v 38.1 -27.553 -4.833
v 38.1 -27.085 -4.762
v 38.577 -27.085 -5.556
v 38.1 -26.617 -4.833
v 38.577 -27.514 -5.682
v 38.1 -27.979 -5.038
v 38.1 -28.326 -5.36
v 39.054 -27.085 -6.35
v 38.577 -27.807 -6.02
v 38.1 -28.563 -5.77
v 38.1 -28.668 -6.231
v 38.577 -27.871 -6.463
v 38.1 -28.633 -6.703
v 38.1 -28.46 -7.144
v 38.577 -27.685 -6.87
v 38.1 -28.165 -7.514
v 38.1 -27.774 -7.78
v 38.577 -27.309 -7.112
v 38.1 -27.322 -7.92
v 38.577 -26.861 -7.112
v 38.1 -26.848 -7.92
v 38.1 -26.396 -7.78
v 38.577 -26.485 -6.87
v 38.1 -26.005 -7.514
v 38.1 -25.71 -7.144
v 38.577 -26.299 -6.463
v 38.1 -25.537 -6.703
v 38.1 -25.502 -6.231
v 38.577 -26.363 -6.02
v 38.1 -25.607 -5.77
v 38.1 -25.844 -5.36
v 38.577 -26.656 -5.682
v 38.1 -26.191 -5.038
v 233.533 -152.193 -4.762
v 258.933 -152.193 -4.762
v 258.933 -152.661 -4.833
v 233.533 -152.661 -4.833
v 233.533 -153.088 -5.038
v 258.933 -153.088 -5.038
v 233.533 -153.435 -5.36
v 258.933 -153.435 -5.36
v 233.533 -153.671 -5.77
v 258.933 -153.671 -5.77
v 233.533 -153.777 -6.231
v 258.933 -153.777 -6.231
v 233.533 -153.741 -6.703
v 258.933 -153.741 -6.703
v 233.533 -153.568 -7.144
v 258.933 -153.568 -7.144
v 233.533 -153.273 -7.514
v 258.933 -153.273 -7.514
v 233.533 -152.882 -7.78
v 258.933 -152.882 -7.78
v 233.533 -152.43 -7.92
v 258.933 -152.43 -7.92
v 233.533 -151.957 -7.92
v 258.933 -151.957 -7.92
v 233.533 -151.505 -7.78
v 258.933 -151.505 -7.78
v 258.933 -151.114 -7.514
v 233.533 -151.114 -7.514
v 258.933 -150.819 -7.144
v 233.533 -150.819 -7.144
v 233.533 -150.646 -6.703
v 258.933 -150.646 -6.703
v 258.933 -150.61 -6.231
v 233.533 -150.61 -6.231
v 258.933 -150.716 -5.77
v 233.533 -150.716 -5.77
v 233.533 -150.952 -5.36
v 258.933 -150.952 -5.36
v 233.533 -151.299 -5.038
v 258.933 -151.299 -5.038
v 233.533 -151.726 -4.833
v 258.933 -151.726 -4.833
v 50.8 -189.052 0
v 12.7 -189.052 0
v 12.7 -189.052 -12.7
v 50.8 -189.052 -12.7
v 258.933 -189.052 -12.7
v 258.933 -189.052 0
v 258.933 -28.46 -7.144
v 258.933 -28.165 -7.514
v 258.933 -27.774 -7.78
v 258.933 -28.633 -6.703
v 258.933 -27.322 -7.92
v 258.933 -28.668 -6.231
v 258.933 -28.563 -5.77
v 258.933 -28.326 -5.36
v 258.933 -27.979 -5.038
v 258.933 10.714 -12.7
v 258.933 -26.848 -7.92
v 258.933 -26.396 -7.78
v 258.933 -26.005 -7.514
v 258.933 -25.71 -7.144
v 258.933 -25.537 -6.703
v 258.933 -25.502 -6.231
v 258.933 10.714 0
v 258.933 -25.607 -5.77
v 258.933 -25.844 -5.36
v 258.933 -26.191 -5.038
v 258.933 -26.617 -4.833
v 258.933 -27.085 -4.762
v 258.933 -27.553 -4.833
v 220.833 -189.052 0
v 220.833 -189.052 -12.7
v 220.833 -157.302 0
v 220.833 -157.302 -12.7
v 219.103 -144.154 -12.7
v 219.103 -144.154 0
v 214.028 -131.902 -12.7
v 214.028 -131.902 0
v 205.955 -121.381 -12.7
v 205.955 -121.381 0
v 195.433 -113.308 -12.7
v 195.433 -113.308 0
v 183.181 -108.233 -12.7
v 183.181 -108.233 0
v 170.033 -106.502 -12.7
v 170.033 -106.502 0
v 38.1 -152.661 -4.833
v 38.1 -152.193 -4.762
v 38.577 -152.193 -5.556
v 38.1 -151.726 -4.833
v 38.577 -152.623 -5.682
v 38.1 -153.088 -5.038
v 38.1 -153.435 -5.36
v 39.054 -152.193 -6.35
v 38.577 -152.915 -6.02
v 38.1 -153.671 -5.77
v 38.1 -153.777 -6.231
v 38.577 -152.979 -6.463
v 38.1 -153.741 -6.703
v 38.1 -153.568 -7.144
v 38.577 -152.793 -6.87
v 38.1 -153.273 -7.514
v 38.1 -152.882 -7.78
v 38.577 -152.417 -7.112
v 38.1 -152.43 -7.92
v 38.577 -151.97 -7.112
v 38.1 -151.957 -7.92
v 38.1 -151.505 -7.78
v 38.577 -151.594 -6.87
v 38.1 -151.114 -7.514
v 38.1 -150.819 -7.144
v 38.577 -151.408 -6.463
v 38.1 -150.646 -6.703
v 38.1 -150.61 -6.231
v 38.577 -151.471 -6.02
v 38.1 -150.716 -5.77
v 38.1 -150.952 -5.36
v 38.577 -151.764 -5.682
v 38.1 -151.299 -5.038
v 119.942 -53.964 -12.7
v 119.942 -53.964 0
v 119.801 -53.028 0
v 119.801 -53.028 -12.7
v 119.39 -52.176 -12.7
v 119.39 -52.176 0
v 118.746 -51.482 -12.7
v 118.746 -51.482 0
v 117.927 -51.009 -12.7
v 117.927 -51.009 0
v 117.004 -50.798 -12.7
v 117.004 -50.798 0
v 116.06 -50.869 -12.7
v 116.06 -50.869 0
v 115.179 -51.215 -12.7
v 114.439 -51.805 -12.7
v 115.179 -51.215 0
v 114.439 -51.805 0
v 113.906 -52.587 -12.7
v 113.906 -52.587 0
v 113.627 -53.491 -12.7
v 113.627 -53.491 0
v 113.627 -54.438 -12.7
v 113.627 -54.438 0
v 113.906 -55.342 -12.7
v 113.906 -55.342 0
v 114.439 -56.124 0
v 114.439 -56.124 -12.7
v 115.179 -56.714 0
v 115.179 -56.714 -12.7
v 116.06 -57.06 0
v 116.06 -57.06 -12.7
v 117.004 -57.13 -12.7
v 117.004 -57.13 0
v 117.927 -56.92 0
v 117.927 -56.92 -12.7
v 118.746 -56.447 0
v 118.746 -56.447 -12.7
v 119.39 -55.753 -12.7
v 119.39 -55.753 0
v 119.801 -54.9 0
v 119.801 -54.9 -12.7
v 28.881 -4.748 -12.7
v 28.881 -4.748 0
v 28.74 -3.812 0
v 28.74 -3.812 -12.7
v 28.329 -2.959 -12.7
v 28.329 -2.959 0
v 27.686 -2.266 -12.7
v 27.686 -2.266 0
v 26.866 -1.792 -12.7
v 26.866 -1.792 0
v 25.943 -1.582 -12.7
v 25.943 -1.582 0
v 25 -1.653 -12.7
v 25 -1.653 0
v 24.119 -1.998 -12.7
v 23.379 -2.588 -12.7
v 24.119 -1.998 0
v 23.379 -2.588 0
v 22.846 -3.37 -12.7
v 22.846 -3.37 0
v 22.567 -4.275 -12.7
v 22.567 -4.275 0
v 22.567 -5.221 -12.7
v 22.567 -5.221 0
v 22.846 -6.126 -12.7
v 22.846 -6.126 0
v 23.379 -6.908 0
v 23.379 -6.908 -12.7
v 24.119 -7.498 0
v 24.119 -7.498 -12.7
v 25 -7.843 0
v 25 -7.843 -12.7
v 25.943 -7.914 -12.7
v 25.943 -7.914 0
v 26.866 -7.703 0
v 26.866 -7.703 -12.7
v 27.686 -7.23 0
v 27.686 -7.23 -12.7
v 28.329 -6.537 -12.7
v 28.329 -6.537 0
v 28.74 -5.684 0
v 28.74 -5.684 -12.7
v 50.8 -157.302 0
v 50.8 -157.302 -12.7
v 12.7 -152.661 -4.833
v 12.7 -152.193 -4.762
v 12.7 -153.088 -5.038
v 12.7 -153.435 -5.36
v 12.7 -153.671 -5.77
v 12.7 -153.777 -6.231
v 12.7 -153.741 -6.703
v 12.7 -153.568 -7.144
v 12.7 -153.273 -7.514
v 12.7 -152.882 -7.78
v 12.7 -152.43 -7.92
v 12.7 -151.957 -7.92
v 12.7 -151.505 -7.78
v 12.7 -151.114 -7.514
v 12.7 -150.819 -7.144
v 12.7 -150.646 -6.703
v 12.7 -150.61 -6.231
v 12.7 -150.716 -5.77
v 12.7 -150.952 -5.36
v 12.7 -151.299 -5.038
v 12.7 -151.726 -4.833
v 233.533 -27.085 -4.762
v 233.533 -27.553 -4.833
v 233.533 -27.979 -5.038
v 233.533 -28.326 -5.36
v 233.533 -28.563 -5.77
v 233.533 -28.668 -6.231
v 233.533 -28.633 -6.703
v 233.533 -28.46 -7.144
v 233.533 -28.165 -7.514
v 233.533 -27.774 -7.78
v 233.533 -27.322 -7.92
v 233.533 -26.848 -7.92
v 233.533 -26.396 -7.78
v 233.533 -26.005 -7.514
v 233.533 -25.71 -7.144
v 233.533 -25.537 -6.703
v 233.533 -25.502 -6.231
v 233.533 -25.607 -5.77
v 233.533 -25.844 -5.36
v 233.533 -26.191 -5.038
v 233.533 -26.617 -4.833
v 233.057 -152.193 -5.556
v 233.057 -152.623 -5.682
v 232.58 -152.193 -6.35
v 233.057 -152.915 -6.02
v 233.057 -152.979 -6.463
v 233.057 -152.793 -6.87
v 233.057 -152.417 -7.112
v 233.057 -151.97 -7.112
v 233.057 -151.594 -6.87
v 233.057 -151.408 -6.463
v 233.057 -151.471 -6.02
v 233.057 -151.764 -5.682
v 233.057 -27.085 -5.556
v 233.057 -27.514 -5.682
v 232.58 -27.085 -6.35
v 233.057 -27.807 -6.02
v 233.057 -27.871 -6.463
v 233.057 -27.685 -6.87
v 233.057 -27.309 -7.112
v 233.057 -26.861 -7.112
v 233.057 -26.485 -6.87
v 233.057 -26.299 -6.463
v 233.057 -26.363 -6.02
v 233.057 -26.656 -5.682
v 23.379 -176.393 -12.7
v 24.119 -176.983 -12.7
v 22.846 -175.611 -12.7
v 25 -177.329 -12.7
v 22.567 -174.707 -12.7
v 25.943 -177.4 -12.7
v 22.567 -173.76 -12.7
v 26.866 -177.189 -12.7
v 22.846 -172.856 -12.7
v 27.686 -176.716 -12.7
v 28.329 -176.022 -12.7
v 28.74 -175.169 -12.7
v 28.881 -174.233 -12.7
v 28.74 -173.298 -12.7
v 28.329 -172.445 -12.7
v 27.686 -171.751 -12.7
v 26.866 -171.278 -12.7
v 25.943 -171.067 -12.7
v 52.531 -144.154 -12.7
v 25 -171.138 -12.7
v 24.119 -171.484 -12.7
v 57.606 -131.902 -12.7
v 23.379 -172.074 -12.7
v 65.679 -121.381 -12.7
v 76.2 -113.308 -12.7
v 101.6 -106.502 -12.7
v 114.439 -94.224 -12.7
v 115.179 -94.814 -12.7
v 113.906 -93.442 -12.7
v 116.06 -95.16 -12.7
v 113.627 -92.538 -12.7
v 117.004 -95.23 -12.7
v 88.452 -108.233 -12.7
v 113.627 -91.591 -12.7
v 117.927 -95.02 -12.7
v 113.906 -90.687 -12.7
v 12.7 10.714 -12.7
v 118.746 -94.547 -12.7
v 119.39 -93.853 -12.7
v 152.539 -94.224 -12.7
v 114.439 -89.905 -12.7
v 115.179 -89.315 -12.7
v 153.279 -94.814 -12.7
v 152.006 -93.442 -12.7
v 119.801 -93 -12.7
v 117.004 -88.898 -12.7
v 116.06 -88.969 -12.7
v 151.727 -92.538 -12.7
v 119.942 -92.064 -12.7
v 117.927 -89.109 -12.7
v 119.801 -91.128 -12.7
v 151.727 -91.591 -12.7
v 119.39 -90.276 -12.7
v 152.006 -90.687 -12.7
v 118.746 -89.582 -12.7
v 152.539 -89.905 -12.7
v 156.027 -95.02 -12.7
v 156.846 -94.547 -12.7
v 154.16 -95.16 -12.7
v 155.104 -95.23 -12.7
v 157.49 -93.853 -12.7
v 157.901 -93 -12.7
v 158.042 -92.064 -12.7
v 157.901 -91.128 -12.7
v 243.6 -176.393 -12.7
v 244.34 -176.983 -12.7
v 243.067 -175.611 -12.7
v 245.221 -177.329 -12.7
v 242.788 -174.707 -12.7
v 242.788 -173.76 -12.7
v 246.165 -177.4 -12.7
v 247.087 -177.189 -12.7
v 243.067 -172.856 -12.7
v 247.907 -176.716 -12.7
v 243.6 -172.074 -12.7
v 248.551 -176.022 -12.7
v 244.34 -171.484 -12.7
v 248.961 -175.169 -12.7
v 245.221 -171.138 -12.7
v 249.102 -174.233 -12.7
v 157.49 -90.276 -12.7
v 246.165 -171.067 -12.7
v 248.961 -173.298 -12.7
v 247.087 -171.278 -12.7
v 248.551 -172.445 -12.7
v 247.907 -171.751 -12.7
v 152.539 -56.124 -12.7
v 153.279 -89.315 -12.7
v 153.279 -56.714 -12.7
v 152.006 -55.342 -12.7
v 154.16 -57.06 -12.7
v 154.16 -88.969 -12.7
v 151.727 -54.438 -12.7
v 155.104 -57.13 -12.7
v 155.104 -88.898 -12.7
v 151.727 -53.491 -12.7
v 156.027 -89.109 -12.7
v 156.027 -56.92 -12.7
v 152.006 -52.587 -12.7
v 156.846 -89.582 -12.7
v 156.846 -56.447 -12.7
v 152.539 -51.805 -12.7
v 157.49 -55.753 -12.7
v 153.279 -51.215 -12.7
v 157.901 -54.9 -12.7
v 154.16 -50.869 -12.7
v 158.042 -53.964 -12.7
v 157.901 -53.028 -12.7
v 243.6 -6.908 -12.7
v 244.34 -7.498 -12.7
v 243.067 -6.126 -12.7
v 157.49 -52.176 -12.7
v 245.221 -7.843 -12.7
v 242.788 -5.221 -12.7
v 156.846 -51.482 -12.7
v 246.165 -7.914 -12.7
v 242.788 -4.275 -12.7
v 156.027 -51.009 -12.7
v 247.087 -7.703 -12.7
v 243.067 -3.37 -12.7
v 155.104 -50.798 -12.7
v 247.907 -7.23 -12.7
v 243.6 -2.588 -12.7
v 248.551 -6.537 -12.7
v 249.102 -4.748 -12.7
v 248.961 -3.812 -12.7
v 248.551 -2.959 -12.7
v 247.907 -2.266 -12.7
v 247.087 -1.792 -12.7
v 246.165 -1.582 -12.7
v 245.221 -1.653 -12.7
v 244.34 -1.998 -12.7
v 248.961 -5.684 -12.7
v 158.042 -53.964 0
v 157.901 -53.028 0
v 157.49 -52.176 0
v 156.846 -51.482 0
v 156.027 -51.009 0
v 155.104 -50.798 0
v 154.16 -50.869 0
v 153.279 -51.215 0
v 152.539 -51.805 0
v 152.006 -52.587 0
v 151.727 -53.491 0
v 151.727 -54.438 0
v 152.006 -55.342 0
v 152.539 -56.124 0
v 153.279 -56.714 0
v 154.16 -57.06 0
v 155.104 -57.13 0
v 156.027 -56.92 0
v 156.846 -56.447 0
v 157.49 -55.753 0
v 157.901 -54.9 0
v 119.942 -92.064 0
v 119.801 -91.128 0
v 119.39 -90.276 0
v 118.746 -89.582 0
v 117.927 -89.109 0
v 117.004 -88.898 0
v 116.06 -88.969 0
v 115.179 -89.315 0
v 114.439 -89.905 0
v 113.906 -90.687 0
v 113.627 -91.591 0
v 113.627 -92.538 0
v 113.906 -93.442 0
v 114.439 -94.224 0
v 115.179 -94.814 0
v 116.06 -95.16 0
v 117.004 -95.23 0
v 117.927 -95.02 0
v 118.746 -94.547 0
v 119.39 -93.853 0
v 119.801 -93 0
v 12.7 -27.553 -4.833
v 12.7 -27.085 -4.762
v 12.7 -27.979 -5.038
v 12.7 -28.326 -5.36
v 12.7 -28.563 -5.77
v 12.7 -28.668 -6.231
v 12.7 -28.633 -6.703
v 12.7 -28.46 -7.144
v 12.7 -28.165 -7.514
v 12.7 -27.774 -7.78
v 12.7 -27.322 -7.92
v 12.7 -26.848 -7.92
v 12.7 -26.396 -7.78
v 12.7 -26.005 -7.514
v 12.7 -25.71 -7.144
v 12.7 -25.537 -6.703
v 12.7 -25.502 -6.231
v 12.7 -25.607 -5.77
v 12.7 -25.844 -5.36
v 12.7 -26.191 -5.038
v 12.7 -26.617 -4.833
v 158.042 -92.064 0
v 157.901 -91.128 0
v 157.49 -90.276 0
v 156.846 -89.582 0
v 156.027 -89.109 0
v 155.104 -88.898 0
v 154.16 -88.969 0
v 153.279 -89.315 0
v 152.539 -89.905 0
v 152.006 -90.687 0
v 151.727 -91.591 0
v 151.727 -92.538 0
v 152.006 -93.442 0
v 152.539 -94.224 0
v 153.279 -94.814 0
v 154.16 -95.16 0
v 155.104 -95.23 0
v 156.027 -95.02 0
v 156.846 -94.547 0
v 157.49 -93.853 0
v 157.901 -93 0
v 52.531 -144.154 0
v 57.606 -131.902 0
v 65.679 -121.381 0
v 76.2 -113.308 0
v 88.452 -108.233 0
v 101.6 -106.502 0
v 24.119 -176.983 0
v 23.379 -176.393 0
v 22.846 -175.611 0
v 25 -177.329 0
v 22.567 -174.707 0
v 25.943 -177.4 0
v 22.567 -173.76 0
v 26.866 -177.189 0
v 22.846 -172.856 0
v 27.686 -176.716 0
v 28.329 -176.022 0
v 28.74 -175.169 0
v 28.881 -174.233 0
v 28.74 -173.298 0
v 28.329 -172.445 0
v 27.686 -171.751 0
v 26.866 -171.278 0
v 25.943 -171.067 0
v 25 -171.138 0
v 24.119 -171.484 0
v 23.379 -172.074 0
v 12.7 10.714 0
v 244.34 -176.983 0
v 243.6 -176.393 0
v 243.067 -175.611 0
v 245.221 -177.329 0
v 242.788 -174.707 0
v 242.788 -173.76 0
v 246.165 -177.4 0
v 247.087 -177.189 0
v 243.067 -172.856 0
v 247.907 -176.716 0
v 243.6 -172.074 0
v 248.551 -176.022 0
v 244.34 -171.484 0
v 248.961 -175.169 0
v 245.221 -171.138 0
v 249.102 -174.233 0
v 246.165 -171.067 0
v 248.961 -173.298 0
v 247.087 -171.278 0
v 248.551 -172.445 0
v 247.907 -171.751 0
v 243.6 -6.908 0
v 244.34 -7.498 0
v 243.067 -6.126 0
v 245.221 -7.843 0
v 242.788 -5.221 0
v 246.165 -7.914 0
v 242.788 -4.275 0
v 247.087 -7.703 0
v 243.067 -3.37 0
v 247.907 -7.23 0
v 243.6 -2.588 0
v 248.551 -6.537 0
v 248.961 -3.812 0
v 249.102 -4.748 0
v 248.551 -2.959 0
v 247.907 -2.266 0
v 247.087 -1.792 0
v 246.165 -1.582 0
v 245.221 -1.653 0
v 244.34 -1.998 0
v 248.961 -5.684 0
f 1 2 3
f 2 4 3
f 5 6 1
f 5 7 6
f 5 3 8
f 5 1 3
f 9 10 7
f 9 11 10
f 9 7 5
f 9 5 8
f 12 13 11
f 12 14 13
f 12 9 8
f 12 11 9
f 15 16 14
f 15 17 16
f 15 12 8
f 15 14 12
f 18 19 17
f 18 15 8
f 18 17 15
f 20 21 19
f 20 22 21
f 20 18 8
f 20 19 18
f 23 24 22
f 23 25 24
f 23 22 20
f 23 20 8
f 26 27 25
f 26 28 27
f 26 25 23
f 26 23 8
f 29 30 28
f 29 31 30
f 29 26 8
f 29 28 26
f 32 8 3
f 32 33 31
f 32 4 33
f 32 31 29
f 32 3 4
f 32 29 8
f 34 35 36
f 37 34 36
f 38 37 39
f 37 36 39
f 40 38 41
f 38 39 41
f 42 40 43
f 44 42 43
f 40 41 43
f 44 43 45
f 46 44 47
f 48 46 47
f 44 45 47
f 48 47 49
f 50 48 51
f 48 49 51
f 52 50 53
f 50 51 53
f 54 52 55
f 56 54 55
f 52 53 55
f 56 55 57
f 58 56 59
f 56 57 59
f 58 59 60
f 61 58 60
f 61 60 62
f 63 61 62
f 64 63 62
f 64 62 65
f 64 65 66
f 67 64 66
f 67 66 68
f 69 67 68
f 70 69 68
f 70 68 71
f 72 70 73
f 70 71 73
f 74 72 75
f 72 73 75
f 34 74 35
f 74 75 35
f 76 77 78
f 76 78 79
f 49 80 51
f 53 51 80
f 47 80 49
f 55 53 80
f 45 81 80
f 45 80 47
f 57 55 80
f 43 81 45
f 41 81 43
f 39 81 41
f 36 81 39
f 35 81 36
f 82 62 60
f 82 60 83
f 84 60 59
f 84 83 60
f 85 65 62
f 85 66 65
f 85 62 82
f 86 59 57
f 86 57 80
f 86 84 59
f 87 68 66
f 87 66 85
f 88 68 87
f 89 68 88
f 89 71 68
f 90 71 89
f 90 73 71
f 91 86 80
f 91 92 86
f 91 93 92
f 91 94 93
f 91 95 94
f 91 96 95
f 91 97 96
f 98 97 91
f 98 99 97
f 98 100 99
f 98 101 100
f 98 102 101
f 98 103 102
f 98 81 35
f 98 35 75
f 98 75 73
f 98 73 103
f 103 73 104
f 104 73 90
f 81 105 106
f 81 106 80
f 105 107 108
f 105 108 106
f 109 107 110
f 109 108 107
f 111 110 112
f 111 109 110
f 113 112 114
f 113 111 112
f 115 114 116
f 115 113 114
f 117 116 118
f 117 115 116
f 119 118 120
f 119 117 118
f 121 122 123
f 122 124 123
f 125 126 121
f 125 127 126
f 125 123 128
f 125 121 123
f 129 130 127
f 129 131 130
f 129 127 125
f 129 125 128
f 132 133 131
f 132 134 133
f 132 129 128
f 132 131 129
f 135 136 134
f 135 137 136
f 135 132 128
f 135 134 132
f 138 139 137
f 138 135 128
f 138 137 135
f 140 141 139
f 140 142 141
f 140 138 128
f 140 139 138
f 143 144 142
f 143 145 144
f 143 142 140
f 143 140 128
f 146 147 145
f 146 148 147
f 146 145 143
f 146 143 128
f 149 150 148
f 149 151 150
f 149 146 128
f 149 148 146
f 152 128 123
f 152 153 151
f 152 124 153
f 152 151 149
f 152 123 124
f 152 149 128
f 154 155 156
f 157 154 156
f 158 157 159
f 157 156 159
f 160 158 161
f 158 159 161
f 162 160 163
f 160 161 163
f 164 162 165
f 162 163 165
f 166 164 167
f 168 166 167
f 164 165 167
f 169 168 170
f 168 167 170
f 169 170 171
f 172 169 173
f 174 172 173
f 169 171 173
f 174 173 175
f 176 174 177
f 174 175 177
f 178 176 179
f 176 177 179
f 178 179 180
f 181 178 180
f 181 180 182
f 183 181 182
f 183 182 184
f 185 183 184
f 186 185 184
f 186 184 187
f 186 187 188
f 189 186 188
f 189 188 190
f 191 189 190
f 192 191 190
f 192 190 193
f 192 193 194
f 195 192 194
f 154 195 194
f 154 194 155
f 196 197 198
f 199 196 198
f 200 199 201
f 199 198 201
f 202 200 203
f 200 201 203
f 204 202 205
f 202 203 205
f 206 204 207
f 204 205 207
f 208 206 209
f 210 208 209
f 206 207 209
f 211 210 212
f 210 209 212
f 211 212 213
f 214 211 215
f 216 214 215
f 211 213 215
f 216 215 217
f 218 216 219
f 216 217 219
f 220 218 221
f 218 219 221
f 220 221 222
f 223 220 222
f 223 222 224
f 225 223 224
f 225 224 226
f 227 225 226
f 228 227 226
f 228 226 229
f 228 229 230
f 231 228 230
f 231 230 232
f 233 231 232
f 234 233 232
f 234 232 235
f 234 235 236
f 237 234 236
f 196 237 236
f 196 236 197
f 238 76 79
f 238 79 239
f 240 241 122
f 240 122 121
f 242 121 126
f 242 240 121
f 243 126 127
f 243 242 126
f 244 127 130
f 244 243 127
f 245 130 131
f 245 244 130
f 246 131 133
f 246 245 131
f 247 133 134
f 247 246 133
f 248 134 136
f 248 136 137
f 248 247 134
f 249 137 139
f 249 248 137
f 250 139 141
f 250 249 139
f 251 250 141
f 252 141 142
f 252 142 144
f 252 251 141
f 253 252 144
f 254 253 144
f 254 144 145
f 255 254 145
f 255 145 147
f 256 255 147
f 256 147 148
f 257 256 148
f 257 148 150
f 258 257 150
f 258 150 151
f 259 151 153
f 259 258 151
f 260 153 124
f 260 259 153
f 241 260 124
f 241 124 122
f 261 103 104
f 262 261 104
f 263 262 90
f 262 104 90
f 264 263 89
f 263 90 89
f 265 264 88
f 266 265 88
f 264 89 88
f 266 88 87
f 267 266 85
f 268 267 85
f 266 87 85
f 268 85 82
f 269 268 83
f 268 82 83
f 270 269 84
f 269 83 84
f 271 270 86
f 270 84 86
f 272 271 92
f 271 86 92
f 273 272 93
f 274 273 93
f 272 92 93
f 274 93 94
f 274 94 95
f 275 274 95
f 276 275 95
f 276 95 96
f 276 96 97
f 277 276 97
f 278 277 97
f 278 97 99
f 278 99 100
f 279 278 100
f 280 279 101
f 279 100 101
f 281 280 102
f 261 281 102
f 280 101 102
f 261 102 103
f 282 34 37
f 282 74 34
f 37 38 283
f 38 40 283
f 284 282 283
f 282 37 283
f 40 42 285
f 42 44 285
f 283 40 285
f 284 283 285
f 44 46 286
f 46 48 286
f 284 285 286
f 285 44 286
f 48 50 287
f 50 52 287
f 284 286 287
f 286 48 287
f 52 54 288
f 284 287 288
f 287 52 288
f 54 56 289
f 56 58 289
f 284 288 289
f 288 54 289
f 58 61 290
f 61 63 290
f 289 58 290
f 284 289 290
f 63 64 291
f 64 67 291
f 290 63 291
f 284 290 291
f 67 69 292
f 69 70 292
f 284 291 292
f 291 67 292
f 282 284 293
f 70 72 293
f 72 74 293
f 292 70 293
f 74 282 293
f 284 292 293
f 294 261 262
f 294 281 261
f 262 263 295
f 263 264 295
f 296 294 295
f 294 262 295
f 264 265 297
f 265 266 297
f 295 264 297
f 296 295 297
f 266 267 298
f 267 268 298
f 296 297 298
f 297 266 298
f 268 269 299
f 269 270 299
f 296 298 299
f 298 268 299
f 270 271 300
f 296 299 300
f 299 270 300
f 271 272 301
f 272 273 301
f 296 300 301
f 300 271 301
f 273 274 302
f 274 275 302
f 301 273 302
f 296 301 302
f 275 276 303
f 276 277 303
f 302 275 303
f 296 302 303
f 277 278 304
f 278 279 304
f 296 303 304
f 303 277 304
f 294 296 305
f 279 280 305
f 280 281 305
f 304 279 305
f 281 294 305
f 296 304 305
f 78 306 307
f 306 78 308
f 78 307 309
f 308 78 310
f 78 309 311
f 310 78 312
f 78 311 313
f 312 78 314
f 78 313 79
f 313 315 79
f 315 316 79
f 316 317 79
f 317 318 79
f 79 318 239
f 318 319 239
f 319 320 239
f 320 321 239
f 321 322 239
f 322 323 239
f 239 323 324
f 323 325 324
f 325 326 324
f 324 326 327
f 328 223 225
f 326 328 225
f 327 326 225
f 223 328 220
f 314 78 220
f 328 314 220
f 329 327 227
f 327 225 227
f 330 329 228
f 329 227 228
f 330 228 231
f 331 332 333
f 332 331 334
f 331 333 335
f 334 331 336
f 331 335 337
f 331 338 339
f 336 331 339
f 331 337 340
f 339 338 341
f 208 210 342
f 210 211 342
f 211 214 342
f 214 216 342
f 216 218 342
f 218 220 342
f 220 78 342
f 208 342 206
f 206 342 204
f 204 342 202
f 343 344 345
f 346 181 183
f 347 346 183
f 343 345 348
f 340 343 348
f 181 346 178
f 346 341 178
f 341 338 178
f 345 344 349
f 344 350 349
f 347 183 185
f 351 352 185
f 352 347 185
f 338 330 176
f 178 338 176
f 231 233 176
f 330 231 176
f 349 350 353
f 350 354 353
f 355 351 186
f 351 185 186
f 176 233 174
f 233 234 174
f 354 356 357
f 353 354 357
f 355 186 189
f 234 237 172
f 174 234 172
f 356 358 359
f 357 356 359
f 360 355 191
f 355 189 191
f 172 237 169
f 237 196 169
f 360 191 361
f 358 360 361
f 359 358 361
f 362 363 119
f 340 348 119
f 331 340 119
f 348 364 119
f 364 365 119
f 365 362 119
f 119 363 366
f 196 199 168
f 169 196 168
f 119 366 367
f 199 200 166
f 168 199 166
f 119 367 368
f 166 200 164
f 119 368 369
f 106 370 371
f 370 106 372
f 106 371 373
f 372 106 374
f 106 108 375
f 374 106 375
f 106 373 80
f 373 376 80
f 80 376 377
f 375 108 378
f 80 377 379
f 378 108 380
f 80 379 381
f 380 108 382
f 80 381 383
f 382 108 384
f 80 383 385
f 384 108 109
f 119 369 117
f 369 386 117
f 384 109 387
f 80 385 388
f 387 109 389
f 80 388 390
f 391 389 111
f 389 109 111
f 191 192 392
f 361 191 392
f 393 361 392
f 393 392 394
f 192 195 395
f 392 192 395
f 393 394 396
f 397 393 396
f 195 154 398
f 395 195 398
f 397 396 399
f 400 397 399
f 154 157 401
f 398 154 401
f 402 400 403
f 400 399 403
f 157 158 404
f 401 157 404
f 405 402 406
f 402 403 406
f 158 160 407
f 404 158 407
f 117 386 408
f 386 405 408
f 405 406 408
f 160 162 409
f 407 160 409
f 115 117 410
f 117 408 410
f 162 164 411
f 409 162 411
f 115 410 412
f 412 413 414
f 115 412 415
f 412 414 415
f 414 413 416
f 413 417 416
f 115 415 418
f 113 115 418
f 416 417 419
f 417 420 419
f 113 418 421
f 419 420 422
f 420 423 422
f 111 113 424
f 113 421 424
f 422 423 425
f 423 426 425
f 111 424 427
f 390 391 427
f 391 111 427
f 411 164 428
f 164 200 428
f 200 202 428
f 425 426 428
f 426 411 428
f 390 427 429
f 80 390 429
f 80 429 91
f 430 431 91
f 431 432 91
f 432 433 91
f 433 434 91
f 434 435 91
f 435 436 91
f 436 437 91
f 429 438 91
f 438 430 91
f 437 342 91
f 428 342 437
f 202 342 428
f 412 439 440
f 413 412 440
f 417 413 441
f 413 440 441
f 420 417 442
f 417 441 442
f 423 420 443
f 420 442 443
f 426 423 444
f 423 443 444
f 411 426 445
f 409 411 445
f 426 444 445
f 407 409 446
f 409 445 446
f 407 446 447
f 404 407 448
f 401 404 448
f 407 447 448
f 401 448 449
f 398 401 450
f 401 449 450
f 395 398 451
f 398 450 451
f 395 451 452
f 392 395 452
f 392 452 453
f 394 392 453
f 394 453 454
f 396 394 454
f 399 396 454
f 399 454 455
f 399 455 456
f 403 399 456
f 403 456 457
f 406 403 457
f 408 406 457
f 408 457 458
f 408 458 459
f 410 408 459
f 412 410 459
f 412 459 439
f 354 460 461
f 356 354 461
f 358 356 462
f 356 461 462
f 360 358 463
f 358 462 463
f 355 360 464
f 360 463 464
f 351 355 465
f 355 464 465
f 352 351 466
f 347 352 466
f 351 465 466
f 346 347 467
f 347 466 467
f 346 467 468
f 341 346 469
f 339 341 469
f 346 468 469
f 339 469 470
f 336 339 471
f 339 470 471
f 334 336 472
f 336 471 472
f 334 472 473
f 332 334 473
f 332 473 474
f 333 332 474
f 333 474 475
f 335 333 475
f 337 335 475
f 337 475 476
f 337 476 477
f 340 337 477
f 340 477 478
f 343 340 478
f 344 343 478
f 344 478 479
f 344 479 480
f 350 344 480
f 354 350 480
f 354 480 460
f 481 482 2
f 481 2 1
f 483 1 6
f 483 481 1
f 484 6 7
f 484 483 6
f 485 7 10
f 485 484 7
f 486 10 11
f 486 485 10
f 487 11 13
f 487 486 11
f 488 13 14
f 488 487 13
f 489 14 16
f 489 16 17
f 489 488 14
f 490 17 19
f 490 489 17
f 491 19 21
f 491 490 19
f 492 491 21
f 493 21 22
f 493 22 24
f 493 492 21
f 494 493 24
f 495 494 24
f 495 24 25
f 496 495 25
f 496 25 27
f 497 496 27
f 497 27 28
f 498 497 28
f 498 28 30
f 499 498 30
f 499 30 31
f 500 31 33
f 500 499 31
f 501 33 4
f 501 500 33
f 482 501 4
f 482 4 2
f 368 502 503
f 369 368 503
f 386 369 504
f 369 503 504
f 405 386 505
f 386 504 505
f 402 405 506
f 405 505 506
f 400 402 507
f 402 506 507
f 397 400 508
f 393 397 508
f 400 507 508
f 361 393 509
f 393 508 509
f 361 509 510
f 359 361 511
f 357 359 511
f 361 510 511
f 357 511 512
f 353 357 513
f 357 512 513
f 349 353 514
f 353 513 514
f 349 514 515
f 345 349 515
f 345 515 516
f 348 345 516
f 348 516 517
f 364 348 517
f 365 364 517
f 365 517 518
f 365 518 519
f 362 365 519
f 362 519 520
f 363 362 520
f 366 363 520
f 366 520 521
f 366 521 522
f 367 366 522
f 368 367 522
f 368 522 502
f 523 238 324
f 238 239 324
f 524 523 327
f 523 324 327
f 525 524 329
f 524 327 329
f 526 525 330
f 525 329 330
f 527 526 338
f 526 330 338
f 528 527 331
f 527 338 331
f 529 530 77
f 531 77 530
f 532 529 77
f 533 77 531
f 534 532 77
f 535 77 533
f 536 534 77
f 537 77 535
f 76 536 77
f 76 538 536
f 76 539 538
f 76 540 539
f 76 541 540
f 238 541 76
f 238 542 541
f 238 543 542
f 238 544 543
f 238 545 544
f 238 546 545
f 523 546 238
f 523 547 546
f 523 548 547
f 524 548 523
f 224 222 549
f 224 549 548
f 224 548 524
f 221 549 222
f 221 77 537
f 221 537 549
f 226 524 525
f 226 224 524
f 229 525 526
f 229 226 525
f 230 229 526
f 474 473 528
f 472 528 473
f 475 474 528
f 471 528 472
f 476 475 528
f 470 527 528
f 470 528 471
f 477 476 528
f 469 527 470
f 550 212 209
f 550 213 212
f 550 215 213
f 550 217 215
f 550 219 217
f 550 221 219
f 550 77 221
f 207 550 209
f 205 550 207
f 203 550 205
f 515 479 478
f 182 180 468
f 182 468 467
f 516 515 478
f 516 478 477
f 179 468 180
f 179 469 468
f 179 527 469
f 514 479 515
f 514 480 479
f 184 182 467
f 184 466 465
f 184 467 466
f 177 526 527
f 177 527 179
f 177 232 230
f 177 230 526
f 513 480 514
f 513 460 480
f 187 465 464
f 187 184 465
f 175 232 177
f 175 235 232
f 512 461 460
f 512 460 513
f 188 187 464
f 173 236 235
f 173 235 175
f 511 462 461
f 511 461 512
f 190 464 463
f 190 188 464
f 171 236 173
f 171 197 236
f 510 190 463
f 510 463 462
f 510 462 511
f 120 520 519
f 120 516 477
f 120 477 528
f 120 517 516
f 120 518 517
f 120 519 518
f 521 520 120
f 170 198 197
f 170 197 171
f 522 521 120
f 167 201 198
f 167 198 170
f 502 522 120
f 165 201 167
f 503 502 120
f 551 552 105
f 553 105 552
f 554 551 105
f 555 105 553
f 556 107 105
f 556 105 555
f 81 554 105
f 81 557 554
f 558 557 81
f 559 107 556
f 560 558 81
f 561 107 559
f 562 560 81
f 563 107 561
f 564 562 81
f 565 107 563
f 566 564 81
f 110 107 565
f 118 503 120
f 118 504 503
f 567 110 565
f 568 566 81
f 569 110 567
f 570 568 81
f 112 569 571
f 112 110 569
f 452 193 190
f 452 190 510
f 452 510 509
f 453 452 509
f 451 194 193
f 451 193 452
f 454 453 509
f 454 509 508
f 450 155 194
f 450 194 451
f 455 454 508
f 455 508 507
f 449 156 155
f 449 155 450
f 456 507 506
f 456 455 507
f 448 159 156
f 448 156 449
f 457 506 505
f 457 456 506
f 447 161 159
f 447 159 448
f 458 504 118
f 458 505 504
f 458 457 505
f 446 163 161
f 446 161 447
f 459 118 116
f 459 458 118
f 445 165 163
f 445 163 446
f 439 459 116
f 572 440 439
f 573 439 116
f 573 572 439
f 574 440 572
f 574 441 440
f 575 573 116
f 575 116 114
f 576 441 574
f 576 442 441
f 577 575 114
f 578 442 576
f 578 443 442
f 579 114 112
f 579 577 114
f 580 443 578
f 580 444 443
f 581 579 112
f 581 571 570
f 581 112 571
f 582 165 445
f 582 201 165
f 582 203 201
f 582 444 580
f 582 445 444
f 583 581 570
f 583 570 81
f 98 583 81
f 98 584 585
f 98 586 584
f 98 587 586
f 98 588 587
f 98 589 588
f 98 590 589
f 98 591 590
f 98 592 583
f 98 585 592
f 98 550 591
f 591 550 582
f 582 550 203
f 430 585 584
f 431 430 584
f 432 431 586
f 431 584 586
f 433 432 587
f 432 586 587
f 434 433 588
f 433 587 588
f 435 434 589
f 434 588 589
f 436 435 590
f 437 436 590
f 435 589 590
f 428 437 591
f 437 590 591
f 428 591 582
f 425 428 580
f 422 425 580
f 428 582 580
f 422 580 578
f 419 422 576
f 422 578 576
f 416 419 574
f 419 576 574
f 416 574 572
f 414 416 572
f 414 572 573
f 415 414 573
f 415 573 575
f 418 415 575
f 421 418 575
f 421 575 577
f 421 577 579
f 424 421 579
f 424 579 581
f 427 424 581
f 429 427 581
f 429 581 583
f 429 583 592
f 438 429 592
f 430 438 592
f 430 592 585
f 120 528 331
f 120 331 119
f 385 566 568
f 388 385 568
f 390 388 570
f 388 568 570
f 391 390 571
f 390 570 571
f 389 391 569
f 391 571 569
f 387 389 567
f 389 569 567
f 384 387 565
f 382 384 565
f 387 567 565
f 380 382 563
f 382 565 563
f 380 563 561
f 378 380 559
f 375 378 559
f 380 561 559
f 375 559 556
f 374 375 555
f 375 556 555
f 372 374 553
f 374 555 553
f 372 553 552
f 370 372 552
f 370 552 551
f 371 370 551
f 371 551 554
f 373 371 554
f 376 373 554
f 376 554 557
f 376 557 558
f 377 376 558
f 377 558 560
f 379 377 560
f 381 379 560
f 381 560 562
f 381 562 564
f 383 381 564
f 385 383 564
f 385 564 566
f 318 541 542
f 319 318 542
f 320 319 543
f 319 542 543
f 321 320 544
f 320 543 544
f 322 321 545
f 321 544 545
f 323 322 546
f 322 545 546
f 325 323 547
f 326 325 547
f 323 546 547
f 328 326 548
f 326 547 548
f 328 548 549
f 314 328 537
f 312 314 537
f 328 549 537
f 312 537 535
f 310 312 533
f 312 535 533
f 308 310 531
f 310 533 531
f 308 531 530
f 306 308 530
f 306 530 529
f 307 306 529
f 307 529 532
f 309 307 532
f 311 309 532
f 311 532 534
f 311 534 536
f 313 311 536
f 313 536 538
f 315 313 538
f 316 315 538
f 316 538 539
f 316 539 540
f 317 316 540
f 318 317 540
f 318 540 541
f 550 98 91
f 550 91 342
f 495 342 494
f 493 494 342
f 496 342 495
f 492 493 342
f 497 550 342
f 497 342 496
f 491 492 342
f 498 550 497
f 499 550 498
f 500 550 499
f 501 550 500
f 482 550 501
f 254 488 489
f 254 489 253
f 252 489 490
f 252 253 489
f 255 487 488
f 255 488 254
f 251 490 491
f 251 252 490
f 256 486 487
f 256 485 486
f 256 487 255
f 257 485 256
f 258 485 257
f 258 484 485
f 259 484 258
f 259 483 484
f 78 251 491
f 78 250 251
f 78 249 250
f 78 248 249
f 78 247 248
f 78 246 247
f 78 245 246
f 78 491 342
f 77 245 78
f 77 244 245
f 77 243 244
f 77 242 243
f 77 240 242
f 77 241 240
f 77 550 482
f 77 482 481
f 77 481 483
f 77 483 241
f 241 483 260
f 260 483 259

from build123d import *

# Parameters (mm, degrees)
BOSS_EXTRUDE1_DEPTH         = 12.7
F_1_4_0_25_DIAMETER_HOLE1_D = 6.35
FILLET2_R                   = 50.8
HOLE1_AT_2_COUNT            = 2
HOLE1_AT_2_PITCH            = 125.108514383


with BuildPart() as part:
    # Sketch1 → Boss-Extrude1 (new body)
    with BuildSketch(Plane.XY):
        Polygon((258.933482757, 10.713854335), (12.7, 10.713854335), (12.7, -189.051843155), (50.8, -189.051843155), (50.8, -106.501843155), (220.833482757, -106.501843155), (220.833482757, -189.051843155), (258.933482757, -189.051843155), align=None)
    extrude(amount=-BOSS_EXTRUDE1_DEPTH)

    # 1/4 (0.25) Diameter Hole1 (through all)
    with Locations(Plane(origin=(0, 0, -12.7), x_dir=(-1, 0, 0), z_dir=(0, 0, -1))):
        with Locations((-25.706162889, -174.233423282), (-116.766741379, -92.064314729), (-154.866741379, -92.064314729), (-245.927319868, -174.233423282), (-154.866741379, -53.964314729), (-245.927319868, -4.747970506), (-116.766741379, -53.964314729), (-25.706162889, -4.747970506)):
            Hole(F_1_4_0_25_DIAMETER_HOLE1_D / 2)

    # Fillet2
    fillet2_edges = [part.edges().sort_by_distance(p)[0] for p in [
        (220.833482757, -106.501843155, -6.35),
        (50.8, -106.501843155, -6.35),
    ]]
    fillet(fillet2_edges, radius=FILLET2_R)

    # Sketch7 → Hole1 (revolve, cut)
    with BuildSketch(Plane(origin=(0, -152.193459623, -6.35), x_dir=(0, 0, 1), z_dir=(0, 1, 0))):
        Polygon((0, 0), (0, 39.053866233), (1.5875, 38.1), (1.5875, 4.017661662), (5.08, 0), align=None)
    hole1 = revolve(axis=Axis((-14.308894879, -152.193459623, -6.35), (1, 0, 0)), mode=Mode.SUBTRACT)

    # Hole1 at 2: Hole1 ×2
    with Locations(*[(0, i * HOLE1_AT_2_PITCH, 0) for i in range(1, HOLE1_AT_2_COUNT)]):
        add(hole1, mode=Mode.SUBTRACT)

    # Mirror1: Hole1 across plane
    add(hole1.mirror(Plane.ZY.offset(-135.816741379)), mode=Mode.SUBTRACT)

    # Mirror1 copy 1 sketch → Mirror1 copy 1 (revolve, cut)
    with BuildSketch(Plane(origin=(271.633482757, -27.08494524, -6.35), x_dir=(0, 0, 1), z_dir=(0, 1, 0))):
        Polygon((0, 0), (0, -39.053866233), (1.5875, -38.1), (1.5875, -4.017661662), (5.08, 0), align=None)
    revolve(axis=Axis((285.942377636, -27.08494524, -6.35), (1, 0, 0)), mode=Mode.SUBTRACT)


solid = part.part
